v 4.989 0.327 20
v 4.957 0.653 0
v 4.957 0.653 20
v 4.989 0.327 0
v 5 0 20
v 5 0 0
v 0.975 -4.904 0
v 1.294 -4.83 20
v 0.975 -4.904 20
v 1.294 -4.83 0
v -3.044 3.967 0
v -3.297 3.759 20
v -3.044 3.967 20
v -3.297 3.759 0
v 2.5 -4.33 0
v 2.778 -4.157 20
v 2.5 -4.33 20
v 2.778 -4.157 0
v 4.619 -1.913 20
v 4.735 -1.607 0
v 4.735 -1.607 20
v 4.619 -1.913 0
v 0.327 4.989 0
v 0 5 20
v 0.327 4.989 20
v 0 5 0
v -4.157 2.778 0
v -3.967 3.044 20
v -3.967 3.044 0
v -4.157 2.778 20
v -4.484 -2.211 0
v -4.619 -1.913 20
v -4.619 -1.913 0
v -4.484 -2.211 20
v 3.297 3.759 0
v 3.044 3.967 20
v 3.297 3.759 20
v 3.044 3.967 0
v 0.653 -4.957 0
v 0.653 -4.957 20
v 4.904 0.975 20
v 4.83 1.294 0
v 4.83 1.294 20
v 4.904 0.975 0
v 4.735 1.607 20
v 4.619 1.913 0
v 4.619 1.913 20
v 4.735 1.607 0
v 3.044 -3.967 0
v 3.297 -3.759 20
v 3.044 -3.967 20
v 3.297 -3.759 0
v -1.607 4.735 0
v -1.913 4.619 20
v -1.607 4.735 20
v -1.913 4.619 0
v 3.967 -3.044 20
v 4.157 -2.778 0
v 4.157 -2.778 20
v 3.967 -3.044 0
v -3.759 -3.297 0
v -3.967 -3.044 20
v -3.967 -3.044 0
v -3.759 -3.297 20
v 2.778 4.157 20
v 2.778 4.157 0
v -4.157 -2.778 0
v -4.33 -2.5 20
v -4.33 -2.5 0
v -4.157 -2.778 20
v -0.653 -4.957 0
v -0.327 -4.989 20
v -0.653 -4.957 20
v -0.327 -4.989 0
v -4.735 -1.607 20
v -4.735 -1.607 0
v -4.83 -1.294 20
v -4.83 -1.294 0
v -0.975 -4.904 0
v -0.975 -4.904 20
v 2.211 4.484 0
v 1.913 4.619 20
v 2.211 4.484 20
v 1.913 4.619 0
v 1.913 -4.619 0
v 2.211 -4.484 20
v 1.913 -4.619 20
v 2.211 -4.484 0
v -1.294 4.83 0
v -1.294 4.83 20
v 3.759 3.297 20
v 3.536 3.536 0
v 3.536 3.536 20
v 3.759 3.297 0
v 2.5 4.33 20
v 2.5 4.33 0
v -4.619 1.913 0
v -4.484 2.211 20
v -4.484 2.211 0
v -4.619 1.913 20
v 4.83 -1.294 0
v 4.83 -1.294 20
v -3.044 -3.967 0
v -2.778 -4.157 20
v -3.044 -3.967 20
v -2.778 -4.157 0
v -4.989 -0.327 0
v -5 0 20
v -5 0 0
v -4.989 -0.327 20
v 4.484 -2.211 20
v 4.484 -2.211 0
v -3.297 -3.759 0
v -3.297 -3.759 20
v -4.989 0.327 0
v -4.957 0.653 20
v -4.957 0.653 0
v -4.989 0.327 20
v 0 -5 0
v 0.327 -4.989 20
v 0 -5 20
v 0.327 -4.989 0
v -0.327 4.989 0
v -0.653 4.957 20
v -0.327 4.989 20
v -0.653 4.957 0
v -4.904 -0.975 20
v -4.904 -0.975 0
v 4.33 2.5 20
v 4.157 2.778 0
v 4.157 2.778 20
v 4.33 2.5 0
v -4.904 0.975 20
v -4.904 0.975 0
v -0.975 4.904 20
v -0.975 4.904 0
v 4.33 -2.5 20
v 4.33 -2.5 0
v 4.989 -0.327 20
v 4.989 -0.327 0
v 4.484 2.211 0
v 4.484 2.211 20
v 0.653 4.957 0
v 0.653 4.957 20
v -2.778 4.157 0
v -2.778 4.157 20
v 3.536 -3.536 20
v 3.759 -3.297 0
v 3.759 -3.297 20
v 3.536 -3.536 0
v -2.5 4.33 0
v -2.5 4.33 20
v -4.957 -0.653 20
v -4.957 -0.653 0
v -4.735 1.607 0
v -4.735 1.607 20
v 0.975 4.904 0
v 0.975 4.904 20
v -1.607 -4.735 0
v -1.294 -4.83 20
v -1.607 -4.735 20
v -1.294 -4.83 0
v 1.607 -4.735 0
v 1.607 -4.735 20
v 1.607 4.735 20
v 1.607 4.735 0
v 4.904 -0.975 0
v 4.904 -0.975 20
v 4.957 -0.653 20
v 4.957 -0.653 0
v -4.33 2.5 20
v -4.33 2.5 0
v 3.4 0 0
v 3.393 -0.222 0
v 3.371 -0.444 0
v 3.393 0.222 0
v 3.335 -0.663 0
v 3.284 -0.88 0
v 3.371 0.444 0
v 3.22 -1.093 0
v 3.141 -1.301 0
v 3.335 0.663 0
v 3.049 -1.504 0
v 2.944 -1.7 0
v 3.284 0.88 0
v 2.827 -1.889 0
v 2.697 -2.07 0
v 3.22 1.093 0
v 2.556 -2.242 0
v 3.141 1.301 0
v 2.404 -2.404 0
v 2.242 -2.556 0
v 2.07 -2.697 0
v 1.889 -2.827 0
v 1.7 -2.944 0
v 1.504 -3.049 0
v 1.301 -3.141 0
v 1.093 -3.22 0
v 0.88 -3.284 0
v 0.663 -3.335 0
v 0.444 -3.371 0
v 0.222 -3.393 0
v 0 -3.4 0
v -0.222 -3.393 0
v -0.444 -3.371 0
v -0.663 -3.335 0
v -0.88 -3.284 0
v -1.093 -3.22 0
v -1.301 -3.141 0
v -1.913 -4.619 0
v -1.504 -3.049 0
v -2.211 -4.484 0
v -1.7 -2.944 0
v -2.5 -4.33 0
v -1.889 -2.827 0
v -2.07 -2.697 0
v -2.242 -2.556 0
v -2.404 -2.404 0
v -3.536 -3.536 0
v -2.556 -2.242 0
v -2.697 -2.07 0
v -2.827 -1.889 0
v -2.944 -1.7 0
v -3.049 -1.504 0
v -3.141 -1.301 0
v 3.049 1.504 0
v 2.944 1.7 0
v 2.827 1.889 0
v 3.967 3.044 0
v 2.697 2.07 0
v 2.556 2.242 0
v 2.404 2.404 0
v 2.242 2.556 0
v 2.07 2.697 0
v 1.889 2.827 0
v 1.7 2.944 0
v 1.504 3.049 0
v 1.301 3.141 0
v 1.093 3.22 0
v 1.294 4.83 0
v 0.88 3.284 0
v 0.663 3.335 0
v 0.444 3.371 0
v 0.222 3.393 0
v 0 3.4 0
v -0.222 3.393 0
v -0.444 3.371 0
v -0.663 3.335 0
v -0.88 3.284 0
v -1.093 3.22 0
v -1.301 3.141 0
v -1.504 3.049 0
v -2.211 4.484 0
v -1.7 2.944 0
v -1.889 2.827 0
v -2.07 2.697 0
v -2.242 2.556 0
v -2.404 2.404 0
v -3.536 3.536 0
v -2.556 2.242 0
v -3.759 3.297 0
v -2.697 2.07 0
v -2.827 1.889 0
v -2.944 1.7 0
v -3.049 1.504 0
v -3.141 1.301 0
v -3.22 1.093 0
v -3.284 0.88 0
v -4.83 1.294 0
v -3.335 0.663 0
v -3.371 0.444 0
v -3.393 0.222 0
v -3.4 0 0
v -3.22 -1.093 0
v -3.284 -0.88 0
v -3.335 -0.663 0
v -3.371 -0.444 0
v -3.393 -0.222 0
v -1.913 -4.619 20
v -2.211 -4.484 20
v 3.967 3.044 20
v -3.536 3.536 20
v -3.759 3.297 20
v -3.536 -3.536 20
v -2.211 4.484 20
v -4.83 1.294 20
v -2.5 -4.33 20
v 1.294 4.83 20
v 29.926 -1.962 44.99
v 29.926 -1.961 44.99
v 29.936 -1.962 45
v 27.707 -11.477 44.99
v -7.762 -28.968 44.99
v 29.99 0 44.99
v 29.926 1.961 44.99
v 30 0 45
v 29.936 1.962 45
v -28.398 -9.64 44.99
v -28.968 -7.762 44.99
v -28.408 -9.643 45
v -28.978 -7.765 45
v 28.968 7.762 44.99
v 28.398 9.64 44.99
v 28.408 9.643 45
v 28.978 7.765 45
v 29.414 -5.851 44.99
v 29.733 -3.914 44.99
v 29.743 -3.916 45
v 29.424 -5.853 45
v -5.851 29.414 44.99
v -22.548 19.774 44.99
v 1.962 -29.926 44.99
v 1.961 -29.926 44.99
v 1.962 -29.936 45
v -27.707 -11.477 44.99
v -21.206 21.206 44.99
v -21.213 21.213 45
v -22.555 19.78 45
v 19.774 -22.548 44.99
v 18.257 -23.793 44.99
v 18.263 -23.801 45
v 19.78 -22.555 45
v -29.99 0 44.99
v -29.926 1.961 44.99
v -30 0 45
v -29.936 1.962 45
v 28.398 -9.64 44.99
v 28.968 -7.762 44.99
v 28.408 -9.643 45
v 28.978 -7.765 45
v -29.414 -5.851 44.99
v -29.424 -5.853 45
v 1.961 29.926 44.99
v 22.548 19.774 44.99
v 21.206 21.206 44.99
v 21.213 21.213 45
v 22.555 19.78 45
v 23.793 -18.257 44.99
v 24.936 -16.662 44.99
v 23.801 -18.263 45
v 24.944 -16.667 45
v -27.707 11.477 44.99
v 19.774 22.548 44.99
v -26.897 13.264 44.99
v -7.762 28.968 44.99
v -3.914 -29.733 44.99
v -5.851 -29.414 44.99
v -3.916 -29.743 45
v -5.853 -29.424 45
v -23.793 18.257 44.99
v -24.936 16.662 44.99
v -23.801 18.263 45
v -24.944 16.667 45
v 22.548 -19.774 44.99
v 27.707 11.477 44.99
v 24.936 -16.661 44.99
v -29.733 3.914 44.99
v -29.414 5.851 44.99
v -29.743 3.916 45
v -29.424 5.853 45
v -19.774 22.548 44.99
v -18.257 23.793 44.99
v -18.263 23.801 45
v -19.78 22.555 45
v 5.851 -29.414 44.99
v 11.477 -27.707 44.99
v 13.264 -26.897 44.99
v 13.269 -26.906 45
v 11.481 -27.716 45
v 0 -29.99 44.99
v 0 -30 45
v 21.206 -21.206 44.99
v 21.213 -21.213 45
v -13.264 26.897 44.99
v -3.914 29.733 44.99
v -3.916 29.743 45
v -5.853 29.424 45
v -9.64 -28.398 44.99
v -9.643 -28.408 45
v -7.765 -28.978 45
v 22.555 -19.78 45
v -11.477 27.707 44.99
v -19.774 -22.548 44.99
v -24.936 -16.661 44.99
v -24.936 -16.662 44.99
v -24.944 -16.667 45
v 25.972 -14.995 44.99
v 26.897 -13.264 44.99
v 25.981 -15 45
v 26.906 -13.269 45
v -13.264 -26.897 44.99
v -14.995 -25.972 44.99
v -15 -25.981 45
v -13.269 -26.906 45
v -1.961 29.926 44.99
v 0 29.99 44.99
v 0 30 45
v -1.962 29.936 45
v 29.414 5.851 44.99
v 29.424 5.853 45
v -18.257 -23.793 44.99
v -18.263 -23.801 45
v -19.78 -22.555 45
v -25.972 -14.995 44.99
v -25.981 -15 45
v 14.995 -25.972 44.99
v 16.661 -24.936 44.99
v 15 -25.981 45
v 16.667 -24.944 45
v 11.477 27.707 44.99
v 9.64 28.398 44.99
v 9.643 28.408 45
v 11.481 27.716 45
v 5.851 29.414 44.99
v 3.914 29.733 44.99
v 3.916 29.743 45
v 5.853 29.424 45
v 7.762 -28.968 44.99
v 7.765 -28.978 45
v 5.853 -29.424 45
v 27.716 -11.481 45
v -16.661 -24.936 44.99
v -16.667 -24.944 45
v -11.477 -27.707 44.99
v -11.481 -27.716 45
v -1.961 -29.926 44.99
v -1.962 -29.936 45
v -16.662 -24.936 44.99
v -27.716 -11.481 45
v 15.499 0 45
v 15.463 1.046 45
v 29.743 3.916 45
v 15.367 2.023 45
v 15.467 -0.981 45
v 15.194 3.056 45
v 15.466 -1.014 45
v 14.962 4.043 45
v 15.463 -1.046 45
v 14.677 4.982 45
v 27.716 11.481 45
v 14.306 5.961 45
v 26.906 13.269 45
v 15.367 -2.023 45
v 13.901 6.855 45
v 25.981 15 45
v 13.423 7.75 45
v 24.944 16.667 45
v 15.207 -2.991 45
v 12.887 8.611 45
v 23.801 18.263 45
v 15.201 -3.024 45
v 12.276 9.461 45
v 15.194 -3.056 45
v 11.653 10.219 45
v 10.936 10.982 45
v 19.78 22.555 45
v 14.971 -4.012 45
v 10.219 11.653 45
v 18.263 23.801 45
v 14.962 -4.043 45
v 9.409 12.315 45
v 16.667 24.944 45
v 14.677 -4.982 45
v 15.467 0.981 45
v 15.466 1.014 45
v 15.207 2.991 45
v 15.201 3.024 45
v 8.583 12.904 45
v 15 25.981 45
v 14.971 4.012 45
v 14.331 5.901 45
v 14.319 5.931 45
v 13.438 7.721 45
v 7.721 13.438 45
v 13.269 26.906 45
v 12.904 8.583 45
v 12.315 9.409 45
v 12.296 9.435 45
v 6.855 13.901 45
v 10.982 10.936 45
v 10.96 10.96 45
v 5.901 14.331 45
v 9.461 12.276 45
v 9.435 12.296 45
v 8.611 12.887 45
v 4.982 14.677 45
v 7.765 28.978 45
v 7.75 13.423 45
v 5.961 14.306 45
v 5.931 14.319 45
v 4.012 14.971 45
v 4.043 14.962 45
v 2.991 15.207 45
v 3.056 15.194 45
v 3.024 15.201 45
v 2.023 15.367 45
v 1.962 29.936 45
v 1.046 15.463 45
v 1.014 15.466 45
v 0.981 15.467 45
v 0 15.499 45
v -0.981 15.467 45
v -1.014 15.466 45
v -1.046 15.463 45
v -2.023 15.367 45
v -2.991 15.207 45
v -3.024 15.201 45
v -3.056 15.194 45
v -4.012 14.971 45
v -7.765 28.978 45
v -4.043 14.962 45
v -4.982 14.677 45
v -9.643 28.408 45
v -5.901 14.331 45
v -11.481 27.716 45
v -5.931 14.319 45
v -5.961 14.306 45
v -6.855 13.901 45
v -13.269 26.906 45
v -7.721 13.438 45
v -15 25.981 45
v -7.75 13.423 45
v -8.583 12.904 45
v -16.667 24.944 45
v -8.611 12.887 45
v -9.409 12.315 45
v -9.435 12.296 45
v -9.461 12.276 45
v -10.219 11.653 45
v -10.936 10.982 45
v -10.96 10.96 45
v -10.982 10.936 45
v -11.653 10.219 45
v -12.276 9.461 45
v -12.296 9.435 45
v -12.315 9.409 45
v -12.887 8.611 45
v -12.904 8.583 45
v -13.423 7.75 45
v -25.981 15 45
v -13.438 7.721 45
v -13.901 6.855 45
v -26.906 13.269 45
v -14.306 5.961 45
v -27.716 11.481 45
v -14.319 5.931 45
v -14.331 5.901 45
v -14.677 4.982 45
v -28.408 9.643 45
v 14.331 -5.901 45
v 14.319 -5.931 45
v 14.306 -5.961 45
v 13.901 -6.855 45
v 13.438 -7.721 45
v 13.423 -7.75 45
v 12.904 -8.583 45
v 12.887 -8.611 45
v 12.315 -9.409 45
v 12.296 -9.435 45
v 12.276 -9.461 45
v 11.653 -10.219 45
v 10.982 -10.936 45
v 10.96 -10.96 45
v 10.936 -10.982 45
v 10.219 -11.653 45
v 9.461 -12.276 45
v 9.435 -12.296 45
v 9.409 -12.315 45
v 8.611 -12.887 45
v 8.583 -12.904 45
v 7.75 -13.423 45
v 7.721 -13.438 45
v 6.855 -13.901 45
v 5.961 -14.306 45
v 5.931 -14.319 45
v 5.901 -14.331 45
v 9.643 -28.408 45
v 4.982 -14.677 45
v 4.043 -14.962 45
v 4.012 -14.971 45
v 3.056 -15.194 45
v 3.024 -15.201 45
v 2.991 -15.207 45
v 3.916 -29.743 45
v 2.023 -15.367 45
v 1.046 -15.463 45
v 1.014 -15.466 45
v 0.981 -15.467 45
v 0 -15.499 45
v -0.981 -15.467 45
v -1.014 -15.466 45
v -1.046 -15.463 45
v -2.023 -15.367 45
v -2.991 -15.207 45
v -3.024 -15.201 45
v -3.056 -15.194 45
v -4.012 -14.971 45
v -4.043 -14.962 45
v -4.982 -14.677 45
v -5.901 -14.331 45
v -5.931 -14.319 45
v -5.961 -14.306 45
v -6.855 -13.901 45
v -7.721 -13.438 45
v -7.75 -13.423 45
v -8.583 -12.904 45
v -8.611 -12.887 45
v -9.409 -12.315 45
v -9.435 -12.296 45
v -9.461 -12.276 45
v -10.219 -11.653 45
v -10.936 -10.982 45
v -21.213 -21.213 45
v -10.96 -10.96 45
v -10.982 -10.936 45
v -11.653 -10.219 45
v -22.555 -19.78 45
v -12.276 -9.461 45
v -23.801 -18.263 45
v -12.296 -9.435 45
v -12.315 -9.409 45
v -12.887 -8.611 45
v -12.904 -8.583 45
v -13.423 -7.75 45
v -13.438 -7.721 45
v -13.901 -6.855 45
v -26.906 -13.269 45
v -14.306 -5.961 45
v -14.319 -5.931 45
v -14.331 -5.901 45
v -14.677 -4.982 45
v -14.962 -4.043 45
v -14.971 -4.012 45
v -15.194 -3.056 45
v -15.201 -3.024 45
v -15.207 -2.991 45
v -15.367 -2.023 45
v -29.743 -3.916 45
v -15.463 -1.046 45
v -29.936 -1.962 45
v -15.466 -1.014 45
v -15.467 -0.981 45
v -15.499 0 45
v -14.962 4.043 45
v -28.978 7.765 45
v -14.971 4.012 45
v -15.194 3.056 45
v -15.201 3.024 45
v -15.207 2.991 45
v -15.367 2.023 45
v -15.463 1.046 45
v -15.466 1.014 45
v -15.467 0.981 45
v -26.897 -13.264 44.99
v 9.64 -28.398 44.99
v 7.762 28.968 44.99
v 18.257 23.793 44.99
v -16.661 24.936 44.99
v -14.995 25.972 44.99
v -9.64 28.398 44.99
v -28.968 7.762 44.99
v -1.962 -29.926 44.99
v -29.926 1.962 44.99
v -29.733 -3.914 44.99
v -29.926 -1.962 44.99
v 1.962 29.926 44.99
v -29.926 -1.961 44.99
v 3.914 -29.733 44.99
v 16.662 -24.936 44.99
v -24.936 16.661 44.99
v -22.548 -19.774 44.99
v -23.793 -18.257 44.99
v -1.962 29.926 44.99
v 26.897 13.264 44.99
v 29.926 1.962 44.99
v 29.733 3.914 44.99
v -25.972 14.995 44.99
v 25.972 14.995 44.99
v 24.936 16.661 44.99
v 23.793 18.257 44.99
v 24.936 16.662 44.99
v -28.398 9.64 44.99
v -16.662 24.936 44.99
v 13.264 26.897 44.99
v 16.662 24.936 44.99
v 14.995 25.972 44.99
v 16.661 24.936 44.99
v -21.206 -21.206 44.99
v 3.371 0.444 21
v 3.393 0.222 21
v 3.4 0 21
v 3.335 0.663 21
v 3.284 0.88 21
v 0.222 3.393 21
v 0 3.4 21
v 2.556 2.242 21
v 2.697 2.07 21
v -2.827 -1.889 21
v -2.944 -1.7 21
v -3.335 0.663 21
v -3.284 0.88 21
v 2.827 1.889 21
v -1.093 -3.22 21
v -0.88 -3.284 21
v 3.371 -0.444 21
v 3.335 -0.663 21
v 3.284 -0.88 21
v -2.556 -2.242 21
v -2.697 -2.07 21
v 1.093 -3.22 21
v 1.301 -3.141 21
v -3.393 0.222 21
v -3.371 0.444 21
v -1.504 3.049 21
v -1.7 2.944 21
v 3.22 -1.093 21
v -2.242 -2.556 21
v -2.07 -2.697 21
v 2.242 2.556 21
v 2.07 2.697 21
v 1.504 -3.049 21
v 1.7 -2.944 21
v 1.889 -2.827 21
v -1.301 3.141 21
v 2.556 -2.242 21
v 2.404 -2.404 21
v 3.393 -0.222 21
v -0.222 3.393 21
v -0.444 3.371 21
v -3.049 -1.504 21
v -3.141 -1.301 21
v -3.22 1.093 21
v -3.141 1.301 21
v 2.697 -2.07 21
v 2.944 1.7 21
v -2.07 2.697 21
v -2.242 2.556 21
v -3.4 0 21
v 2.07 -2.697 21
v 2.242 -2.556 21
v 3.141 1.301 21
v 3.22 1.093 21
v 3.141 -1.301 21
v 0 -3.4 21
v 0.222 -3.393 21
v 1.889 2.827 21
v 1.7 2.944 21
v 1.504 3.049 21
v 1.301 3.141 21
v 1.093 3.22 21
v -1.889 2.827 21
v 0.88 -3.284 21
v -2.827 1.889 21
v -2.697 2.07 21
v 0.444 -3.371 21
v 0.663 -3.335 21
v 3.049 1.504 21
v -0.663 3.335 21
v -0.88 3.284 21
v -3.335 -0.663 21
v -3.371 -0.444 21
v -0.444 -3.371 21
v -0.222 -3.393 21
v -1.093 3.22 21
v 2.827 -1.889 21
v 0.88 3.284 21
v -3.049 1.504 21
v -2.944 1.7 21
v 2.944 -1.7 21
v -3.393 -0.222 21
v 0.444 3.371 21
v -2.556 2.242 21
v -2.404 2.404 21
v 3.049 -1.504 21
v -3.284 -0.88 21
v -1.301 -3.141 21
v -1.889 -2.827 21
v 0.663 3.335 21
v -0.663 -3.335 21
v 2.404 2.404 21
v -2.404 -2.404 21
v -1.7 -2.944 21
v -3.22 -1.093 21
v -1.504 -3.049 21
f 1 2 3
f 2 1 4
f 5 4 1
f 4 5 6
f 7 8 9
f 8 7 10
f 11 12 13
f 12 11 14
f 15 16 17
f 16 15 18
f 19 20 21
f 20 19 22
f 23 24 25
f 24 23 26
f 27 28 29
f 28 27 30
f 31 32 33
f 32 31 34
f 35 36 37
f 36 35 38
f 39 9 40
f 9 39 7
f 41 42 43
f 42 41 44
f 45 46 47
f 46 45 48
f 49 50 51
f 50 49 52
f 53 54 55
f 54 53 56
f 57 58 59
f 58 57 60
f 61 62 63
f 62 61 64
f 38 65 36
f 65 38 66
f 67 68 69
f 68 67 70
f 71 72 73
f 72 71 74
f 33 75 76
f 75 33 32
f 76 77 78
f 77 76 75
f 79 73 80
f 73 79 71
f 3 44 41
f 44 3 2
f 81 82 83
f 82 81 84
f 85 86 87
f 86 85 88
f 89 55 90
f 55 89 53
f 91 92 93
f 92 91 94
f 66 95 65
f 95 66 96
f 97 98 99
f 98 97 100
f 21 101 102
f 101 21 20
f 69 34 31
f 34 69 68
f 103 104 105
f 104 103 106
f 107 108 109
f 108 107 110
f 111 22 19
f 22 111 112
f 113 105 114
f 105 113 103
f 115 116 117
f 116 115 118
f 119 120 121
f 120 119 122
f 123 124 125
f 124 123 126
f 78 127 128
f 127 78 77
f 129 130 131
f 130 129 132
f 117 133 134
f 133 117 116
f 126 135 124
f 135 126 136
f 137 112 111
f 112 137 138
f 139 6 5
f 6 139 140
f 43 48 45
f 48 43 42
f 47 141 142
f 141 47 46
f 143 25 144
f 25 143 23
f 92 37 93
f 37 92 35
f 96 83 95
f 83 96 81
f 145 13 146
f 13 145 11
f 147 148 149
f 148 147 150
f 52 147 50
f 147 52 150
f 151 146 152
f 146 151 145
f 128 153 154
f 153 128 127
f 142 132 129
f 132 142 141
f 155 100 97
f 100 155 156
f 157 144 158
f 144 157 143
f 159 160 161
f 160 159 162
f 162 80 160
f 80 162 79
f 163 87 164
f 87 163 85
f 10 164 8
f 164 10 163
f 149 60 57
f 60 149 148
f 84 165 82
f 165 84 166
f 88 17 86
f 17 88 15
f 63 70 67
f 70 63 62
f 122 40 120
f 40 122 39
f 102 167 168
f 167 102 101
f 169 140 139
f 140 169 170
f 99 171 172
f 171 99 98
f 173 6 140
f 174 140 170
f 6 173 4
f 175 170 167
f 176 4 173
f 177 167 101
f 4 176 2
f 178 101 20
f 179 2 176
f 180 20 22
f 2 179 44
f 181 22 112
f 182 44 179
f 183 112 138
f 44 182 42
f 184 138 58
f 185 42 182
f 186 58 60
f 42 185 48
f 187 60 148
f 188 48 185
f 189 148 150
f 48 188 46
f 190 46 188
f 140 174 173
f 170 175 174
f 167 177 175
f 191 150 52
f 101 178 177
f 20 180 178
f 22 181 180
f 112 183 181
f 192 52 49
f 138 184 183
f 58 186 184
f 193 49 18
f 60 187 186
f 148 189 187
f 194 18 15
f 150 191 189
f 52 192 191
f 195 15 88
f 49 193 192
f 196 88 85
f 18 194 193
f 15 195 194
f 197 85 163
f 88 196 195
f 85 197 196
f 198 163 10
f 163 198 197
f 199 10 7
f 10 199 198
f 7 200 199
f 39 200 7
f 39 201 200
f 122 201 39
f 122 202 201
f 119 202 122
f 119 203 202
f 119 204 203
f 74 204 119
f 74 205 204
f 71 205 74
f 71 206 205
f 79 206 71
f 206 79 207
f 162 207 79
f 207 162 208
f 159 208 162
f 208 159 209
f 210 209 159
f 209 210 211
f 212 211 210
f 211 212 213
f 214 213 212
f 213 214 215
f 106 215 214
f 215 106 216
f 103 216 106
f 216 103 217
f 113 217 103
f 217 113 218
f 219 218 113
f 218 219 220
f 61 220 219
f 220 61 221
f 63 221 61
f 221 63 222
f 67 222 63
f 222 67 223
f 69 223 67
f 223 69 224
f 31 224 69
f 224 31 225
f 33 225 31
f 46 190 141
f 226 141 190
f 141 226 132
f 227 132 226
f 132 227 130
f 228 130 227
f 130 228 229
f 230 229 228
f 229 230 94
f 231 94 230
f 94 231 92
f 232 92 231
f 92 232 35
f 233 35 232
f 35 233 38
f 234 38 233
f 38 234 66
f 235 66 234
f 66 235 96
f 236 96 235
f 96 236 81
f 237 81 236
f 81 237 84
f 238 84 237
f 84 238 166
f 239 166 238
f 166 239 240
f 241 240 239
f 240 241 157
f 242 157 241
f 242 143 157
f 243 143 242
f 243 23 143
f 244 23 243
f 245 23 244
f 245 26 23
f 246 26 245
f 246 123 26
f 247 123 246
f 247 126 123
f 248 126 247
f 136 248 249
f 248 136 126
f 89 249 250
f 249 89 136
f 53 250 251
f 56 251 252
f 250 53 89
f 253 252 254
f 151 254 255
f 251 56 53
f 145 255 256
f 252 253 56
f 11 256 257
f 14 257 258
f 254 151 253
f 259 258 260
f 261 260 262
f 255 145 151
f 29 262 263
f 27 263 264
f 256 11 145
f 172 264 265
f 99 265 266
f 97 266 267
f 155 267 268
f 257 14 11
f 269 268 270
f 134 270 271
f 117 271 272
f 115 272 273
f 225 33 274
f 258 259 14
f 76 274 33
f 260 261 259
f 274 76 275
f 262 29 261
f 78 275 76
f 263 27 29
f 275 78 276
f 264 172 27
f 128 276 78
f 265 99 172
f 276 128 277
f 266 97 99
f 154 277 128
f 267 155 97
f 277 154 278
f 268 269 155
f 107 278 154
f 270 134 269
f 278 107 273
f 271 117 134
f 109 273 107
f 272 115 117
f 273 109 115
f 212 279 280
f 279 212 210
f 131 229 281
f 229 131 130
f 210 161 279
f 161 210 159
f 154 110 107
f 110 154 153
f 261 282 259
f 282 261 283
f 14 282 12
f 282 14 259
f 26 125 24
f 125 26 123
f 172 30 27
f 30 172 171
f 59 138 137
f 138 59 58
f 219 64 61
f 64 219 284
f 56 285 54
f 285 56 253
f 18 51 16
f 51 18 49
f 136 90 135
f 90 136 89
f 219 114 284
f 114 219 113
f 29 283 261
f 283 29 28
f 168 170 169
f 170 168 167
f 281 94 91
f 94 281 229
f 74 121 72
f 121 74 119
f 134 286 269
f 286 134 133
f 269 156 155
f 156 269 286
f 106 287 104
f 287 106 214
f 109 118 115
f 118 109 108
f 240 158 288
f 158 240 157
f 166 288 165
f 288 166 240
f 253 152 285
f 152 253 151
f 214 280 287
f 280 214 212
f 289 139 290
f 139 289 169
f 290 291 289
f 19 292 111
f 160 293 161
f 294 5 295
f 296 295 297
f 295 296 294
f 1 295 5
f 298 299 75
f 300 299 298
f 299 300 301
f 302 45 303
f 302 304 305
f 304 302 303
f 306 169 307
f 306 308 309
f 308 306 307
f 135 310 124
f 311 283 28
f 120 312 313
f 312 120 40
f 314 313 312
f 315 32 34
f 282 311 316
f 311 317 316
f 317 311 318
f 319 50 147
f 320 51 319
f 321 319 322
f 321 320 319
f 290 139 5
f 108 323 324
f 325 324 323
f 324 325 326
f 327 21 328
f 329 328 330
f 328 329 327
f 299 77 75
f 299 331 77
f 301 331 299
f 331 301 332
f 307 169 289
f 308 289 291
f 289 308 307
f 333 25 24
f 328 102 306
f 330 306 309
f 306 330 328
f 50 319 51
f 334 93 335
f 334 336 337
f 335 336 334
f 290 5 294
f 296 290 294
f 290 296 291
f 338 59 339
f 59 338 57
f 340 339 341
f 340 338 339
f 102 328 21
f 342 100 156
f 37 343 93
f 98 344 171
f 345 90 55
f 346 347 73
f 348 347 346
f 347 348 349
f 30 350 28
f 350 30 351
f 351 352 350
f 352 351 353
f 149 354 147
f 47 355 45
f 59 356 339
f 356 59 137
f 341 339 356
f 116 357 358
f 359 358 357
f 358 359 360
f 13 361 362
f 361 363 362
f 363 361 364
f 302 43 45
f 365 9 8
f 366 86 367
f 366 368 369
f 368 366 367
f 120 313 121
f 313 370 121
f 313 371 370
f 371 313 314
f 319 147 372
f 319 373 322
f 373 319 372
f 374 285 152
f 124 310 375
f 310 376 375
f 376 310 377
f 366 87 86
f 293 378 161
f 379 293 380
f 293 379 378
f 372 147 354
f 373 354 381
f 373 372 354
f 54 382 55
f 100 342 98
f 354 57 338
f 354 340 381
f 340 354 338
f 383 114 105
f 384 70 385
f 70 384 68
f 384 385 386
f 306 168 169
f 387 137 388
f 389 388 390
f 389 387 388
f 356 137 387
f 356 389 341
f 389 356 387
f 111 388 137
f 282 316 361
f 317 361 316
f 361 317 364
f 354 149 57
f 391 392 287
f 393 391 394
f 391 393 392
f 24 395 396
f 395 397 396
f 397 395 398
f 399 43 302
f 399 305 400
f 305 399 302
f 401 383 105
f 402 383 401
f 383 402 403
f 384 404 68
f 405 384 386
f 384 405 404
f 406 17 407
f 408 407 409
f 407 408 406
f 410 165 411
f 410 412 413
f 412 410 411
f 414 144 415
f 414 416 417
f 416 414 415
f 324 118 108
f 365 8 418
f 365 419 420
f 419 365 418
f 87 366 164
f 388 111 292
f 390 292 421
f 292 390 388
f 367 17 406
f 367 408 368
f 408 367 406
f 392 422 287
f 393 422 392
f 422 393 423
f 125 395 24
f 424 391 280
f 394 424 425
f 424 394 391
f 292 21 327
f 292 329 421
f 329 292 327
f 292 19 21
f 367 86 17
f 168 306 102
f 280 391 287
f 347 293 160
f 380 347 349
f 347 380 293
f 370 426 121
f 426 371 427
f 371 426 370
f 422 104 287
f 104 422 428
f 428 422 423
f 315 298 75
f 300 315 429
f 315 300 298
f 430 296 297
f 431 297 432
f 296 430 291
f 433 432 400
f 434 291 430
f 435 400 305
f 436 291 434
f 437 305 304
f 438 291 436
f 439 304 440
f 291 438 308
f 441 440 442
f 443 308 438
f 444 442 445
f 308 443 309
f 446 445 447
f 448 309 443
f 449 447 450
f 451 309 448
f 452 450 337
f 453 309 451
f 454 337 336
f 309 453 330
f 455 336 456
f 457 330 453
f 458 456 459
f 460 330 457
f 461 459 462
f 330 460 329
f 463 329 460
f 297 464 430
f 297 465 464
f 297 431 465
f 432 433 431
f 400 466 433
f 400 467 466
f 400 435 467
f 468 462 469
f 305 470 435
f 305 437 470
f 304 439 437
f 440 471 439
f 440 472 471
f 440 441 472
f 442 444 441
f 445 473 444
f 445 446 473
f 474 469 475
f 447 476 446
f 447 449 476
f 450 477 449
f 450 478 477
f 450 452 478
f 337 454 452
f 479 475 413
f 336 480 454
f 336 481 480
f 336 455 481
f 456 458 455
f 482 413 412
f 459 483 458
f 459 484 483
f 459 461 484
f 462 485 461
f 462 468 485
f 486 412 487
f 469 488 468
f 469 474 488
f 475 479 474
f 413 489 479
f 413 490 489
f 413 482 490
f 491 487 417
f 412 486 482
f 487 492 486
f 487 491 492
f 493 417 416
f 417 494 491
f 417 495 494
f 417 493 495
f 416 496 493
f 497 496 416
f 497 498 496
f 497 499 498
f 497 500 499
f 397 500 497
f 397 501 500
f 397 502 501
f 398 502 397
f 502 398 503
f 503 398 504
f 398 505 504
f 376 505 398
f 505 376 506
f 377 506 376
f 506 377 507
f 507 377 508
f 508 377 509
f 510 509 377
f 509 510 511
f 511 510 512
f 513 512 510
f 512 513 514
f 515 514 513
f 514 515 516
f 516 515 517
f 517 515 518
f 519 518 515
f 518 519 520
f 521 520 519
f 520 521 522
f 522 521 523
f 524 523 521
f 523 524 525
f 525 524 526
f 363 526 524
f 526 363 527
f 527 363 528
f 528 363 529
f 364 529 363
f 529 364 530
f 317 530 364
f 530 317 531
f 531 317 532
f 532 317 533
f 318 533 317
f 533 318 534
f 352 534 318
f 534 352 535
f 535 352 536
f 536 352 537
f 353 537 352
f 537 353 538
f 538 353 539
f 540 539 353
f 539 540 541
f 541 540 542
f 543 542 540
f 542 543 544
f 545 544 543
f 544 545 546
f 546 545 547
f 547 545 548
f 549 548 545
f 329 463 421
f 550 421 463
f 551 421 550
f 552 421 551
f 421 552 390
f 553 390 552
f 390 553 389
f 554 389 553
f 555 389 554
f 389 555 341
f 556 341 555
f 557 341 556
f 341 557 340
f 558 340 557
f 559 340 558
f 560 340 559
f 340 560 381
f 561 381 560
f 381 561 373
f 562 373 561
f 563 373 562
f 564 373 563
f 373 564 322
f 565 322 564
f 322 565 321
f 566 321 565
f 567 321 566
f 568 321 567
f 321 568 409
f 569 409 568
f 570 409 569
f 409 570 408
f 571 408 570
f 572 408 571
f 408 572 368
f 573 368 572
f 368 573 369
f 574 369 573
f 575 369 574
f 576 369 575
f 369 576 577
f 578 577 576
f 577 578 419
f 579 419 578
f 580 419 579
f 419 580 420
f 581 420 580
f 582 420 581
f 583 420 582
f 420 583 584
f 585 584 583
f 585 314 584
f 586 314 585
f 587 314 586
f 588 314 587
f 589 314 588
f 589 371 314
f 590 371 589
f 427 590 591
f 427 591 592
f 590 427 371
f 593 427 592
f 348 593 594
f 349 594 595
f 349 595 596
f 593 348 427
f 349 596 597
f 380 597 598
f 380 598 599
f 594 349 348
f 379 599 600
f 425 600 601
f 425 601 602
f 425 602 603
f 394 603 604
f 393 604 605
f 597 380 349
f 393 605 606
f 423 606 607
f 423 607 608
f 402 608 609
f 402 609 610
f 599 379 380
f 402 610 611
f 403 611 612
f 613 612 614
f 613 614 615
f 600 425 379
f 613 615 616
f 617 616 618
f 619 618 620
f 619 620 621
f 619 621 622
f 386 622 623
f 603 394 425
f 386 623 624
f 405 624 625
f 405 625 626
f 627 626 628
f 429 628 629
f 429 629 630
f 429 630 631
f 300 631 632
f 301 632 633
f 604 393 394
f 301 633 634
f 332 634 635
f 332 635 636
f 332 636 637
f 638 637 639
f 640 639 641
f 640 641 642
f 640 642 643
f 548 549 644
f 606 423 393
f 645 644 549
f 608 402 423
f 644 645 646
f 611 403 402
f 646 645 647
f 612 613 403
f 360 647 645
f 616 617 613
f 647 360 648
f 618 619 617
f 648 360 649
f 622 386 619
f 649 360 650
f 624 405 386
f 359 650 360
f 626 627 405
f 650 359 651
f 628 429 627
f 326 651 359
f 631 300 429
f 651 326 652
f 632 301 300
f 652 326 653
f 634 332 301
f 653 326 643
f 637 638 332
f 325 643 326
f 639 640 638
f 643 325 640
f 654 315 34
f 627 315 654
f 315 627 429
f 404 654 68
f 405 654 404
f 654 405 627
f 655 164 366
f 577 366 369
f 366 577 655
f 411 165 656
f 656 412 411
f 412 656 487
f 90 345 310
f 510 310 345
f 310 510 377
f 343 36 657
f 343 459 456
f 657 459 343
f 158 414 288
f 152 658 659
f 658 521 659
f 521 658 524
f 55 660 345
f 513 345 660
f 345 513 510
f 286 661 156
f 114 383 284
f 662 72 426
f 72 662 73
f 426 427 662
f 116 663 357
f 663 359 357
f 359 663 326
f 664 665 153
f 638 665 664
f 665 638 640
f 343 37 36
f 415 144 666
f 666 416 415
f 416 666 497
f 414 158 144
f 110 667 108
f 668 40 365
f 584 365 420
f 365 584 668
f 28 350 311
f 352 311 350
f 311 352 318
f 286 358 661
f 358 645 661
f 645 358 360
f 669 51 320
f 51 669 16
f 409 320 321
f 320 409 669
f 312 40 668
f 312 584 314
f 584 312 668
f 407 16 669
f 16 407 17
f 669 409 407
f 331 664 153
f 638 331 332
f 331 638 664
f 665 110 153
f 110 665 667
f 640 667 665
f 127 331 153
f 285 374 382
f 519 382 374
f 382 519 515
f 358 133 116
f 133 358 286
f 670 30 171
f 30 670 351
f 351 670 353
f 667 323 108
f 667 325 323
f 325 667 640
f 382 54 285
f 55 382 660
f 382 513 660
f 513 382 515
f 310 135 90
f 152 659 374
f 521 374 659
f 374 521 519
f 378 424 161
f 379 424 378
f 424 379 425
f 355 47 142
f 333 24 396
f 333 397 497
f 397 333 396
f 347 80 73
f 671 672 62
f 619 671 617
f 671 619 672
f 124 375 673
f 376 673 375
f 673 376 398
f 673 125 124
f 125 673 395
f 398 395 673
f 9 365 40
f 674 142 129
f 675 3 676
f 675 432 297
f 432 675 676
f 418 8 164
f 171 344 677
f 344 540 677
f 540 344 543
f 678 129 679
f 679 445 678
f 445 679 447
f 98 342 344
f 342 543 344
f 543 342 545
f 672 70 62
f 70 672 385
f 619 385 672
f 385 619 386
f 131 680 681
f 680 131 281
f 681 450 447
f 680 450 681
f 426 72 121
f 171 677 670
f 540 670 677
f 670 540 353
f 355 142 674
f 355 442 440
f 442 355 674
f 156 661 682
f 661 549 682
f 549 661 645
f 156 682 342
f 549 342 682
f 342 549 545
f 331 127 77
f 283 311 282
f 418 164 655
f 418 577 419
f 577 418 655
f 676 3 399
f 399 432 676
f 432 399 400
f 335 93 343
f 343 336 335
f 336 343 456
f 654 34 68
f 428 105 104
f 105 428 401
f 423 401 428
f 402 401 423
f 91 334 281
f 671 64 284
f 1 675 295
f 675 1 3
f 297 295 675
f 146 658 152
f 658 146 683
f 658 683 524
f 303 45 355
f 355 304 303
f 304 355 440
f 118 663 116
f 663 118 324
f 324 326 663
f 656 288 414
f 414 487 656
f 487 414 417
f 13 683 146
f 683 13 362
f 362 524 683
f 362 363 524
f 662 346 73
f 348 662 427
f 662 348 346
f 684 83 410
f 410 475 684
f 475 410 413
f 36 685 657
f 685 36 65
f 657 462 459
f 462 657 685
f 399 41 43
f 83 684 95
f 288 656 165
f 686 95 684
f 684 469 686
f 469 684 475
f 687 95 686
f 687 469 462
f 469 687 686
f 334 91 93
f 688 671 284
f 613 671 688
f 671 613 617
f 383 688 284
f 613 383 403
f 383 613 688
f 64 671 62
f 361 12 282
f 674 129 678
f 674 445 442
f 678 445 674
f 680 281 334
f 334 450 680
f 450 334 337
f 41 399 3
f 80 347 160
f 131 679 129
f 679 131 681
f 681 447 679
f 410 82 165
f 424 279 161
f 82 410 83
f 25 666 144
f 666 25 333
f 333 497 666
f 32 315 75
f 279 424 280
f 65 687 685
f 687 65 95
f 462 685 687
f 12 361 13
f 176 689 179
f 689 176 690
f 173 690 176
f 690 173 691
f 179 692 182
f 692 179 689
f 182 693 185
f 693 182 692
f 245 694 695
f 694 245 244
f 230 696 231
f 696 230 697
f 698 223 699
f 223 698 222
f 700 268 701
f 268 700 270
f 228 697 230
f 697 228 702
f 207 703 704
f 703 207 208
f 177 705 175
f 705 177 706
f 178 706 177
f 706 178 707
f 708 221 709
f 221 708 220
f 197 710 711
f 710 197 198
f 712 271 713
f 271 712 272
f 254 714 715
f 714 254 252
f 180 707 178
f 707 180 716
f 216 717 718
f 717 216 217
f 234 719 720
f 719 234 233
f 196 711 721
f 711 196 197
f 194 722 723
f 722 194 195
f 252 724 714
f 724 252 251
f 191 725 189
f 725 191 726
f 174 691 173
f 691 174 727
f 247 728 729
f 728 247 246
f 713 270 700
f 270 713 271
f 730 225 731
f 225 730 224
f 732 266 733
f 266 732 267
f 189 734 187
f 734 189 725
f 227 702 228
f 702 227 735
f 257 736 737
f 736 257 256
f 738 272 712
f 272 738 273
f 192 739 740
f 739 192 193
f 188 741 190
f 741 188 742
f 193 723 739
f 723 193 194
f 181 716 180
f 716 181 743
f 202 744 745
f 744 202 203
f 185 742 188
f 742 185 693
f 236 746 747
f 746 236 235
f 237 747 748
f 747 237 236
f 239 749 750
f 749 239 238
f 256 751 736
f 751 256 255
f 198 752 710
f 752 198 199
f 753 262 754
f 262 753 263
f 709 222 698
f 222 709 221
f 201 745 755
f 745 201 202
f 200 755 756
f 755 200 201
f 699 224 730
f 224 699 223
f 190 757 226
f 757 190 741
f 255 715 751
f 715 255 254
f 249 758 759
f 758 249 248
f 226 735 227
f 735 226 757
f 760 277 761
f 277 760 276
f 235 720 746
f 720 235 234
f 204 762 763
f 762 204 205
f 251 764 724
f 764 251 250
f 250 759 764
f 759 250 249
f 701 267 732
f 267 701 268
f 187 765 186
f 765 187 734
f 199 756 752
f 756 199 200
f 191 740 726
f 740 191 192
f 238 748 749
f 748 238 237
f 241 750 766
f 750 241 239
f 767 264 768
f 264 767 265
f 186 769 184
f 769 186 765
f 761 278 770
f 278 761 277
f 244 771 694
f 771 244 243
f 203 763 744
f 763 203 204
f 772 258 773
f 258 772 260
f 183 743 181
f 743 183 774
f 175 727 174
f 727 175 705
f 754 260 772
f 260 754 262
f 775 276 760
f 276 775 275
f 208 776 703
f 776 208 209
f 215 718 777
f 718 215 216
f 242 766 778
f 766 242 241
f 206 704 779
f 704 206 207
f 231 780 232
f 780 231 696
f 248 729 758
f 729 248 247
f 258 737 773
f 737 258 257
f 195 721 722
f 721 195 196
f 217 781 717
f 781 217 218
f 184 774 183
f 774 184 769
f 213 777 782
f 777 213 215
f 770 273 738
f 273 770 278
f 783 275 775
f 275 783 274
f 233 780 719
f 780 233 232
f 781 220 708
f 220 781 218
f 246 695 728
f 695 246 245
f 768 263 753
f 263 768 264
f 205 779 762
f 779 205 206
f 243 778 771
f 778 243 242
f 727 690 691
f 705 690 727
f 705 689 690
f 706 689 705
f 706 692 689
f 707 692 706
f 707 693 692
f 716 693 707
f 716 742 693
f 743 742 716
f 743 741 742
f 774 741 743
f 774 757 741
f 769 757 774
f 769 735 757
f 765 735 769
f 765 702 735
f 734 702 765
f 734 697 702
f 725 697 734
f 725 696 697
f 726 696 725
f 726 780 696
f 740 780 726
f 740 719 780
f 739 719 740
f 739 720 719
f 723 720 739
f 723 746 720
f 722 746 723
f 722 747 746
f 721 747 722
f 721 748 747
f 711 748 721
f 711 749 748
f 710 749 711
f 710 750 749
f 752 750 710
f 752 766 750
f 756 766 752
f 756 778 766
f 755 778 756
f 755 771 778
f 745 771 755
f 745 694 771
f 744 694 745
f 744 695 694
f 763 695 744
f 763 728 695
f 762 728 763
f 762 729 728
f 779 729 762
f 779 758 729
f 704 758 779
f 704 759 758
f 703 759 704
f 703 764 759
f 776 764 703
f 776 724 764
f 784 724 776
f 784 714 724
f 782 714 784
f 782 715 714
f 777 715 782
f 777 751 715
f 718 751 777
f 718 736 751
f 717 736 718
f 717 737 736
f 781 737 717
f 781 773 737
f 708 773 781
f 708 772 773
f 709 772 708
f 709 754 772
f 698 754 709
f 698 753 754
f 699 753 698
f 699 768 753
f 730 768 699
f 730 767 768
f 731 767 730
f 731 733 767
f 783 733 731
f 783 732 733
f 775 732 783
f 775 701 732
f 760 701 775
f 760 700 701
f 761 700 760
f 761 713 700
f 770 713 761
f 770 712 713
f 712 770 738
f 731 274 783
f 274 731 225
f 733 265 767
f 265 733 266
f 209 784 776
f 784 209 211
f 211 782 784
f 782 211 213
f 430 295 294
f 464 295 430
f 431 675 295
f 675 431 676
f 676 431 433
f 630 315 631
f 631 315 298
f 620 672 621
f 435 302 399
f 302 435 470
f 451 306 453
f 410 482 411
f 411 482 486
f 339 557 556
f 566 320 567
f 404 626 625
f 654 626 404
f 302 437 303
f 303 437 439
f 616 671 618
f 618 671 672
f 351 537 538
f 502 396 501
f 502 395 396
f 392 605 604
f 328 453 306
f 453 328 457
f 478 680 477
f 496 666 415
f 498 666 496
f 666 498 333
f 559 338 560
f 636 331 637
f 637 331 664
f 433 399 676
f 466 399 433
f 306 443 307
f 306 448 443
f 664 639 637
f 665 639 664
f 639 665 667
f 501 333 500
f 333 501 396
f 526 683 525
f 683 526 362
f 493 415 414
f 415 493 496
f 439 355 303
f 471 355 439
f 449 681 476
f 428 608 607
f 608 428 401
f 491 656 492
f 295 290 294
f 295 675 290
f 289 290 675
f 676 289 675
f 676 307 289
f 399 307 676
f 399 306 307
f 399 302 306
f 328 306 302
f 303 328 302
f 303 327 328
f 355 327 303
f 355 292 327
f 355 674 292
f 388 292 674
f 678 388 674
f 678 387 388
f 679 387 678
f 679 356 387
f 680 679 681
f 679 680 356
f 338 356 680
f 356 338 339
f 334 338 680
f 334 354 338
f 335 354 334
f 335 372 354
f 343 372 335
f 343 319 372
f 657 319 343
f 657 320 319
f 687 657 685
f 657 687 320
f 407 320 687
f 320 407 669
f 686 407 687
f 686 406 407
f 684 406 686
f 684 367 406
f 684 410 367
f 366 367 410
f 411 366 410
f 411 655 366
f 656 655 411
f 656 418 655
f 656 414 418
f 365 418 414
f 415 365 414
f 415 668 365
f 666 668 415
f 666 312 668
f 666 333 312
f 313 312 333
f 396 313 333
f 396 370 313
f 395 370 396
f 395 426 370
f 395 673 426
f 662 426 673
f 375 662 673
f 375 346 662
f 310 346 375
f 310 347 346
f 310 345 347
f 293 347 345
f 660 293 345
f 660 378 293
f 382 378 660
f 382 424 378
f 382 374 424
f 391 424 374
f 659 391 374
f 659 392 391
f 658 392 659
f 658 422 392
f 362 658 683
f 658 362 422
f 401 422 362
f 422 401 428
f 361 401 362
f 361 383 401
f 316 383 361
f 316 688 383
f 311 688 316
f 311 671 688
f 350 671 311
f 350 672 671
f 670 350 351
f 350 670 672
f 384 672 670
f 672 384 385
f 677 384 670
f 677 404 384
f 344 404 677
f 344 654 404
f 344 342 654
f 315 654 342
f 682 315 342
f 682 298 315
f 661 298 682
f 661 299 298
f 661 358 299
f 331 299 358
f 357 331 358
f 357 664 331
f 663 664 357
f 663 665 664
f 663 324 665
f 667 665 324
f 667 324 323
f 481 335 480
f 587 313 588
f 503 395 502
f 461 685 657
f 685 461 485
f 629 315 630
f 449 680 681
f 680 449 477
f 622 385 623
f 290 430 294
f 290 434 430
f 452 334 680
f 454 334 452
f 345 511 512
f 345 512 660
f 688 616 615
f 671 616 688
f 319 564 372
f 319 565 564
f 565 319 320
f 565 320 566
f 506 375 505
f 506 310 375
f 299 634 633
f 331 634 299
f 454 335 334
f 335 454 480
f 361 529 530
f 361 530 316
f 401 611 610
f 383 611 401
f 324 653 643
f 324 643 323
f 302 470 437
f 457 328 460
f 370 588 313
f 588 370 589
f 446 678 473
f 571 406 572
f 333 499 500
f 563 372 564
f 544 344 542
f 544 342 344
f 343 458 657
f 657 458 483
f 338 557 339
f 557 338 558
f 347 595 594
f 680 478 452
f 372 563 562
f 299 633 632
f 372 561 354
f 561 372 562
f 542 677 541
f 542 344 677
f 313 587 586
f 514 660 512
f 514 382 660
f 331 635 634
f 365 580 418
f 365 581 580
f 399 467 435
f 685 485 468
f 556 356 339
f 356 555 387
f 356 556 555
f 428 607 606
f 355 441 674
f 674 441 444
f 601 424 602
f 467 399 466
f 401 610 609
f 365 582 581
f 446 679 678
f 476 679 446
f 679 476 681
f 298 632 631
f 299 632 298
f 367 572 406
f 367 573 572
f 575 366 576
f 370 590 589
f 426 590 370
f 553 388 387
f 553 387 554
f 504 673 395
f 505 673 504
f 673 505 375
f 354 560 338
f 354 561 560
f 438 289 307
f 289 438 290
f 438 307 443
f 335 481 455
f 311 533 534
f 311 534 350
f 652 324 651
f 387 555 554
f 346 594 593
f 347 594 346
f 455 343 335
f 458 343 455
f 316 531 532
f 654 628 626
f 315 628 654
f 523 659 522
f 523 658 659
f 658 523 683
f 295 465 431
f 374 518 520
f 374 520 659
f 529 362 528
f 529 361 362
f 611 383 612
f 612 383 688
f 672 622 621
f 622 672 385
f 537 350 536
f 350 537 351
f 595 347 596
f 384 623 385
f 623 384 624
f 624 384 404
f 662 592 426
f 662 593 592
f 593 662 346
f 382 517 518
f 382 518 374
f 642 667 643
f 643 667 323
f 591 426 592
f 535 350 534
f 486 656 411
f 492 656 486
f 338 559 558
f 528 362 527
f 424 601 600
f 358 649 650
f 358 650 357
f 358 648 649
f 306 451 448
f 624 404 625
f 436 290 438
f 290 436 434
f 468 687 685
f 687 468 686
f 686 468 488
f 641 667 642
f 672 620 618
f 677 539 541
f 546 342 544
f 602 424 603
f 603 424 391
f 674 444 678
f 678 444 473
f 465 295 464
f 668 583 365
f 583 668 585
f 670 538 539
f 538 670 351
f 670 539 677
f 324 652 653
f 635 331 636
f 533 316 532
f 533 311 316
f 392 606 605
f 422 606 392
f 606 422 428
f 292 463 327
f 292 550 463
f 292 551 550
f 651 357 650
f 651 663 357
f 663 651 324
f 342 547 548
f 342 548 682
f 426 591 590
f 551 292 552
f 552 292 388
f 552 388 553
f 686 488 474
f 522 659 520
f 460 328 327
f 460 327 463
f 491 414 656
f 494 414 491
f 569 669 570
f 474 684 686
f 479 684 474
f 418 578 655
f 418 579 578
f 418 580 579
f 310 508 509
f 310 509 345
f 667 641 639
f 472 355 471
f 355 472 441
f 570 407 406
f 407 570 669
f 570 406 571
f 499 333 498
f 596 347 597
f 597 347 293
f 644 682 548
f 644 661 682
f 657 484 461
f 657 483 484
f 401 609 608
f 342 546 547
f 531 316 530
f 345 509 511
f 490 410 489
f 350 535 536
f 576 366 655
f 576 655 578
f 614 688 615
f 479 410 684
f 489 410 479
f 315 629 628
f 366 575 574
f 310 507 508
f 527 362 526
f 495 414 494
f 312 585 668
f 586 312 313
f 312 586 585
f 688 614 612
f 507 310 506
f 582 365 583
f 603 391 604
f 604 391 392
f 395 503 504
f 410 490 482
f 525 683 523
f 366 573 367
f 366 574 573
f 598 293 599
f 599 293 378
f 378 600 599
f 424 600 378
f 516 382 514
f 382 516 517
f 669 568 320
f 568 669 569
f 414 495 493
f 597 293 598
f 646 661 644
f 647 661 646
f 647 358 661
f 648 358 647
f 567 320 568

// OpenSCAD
// Small lab funnel - printed upright, open top and bottom
// Units: mm

$fn = 96;

// --- Dimensions ---
spout_od      = 10;    // spout outer diameter
spout_len     = 20;    // spout length (z = 0 to 20)
cone_bottom_d = 10;    // cone outer diameter at z = 20
cone_top_d    = 60;    // cone outer diameter at rim (z = 50)
wall          = 1.6;   // wall thickness everywhere

// --- Derived ---
spout_id = spout_od - 2 * wall;   // bore diameter (6.8 mm)
total_h  = spout_len + (cone_top_d - cone_bottom_d) / 2; // 50 mm

difference() {
    union() {
        // Spout
        cylinder(d = spout_od, h = spout_len);
        // Cone from z = 20 to z = 50
        translate([0, 0, spout_len])
            cylinder(d1 = cone_bottom_d, d2 = cone_top_d, h = total_h - spout_len);
    }
    // Bottom hole through the spout
    translate([0, 0, -1])
        cylinder(d = spout_id, h = spout_len + 2);
    // Cone opening at the top
    translate([0, 0, total_h - 0.01])
        cylinder(d1 = cone_top_d, h = 0.02);
}
